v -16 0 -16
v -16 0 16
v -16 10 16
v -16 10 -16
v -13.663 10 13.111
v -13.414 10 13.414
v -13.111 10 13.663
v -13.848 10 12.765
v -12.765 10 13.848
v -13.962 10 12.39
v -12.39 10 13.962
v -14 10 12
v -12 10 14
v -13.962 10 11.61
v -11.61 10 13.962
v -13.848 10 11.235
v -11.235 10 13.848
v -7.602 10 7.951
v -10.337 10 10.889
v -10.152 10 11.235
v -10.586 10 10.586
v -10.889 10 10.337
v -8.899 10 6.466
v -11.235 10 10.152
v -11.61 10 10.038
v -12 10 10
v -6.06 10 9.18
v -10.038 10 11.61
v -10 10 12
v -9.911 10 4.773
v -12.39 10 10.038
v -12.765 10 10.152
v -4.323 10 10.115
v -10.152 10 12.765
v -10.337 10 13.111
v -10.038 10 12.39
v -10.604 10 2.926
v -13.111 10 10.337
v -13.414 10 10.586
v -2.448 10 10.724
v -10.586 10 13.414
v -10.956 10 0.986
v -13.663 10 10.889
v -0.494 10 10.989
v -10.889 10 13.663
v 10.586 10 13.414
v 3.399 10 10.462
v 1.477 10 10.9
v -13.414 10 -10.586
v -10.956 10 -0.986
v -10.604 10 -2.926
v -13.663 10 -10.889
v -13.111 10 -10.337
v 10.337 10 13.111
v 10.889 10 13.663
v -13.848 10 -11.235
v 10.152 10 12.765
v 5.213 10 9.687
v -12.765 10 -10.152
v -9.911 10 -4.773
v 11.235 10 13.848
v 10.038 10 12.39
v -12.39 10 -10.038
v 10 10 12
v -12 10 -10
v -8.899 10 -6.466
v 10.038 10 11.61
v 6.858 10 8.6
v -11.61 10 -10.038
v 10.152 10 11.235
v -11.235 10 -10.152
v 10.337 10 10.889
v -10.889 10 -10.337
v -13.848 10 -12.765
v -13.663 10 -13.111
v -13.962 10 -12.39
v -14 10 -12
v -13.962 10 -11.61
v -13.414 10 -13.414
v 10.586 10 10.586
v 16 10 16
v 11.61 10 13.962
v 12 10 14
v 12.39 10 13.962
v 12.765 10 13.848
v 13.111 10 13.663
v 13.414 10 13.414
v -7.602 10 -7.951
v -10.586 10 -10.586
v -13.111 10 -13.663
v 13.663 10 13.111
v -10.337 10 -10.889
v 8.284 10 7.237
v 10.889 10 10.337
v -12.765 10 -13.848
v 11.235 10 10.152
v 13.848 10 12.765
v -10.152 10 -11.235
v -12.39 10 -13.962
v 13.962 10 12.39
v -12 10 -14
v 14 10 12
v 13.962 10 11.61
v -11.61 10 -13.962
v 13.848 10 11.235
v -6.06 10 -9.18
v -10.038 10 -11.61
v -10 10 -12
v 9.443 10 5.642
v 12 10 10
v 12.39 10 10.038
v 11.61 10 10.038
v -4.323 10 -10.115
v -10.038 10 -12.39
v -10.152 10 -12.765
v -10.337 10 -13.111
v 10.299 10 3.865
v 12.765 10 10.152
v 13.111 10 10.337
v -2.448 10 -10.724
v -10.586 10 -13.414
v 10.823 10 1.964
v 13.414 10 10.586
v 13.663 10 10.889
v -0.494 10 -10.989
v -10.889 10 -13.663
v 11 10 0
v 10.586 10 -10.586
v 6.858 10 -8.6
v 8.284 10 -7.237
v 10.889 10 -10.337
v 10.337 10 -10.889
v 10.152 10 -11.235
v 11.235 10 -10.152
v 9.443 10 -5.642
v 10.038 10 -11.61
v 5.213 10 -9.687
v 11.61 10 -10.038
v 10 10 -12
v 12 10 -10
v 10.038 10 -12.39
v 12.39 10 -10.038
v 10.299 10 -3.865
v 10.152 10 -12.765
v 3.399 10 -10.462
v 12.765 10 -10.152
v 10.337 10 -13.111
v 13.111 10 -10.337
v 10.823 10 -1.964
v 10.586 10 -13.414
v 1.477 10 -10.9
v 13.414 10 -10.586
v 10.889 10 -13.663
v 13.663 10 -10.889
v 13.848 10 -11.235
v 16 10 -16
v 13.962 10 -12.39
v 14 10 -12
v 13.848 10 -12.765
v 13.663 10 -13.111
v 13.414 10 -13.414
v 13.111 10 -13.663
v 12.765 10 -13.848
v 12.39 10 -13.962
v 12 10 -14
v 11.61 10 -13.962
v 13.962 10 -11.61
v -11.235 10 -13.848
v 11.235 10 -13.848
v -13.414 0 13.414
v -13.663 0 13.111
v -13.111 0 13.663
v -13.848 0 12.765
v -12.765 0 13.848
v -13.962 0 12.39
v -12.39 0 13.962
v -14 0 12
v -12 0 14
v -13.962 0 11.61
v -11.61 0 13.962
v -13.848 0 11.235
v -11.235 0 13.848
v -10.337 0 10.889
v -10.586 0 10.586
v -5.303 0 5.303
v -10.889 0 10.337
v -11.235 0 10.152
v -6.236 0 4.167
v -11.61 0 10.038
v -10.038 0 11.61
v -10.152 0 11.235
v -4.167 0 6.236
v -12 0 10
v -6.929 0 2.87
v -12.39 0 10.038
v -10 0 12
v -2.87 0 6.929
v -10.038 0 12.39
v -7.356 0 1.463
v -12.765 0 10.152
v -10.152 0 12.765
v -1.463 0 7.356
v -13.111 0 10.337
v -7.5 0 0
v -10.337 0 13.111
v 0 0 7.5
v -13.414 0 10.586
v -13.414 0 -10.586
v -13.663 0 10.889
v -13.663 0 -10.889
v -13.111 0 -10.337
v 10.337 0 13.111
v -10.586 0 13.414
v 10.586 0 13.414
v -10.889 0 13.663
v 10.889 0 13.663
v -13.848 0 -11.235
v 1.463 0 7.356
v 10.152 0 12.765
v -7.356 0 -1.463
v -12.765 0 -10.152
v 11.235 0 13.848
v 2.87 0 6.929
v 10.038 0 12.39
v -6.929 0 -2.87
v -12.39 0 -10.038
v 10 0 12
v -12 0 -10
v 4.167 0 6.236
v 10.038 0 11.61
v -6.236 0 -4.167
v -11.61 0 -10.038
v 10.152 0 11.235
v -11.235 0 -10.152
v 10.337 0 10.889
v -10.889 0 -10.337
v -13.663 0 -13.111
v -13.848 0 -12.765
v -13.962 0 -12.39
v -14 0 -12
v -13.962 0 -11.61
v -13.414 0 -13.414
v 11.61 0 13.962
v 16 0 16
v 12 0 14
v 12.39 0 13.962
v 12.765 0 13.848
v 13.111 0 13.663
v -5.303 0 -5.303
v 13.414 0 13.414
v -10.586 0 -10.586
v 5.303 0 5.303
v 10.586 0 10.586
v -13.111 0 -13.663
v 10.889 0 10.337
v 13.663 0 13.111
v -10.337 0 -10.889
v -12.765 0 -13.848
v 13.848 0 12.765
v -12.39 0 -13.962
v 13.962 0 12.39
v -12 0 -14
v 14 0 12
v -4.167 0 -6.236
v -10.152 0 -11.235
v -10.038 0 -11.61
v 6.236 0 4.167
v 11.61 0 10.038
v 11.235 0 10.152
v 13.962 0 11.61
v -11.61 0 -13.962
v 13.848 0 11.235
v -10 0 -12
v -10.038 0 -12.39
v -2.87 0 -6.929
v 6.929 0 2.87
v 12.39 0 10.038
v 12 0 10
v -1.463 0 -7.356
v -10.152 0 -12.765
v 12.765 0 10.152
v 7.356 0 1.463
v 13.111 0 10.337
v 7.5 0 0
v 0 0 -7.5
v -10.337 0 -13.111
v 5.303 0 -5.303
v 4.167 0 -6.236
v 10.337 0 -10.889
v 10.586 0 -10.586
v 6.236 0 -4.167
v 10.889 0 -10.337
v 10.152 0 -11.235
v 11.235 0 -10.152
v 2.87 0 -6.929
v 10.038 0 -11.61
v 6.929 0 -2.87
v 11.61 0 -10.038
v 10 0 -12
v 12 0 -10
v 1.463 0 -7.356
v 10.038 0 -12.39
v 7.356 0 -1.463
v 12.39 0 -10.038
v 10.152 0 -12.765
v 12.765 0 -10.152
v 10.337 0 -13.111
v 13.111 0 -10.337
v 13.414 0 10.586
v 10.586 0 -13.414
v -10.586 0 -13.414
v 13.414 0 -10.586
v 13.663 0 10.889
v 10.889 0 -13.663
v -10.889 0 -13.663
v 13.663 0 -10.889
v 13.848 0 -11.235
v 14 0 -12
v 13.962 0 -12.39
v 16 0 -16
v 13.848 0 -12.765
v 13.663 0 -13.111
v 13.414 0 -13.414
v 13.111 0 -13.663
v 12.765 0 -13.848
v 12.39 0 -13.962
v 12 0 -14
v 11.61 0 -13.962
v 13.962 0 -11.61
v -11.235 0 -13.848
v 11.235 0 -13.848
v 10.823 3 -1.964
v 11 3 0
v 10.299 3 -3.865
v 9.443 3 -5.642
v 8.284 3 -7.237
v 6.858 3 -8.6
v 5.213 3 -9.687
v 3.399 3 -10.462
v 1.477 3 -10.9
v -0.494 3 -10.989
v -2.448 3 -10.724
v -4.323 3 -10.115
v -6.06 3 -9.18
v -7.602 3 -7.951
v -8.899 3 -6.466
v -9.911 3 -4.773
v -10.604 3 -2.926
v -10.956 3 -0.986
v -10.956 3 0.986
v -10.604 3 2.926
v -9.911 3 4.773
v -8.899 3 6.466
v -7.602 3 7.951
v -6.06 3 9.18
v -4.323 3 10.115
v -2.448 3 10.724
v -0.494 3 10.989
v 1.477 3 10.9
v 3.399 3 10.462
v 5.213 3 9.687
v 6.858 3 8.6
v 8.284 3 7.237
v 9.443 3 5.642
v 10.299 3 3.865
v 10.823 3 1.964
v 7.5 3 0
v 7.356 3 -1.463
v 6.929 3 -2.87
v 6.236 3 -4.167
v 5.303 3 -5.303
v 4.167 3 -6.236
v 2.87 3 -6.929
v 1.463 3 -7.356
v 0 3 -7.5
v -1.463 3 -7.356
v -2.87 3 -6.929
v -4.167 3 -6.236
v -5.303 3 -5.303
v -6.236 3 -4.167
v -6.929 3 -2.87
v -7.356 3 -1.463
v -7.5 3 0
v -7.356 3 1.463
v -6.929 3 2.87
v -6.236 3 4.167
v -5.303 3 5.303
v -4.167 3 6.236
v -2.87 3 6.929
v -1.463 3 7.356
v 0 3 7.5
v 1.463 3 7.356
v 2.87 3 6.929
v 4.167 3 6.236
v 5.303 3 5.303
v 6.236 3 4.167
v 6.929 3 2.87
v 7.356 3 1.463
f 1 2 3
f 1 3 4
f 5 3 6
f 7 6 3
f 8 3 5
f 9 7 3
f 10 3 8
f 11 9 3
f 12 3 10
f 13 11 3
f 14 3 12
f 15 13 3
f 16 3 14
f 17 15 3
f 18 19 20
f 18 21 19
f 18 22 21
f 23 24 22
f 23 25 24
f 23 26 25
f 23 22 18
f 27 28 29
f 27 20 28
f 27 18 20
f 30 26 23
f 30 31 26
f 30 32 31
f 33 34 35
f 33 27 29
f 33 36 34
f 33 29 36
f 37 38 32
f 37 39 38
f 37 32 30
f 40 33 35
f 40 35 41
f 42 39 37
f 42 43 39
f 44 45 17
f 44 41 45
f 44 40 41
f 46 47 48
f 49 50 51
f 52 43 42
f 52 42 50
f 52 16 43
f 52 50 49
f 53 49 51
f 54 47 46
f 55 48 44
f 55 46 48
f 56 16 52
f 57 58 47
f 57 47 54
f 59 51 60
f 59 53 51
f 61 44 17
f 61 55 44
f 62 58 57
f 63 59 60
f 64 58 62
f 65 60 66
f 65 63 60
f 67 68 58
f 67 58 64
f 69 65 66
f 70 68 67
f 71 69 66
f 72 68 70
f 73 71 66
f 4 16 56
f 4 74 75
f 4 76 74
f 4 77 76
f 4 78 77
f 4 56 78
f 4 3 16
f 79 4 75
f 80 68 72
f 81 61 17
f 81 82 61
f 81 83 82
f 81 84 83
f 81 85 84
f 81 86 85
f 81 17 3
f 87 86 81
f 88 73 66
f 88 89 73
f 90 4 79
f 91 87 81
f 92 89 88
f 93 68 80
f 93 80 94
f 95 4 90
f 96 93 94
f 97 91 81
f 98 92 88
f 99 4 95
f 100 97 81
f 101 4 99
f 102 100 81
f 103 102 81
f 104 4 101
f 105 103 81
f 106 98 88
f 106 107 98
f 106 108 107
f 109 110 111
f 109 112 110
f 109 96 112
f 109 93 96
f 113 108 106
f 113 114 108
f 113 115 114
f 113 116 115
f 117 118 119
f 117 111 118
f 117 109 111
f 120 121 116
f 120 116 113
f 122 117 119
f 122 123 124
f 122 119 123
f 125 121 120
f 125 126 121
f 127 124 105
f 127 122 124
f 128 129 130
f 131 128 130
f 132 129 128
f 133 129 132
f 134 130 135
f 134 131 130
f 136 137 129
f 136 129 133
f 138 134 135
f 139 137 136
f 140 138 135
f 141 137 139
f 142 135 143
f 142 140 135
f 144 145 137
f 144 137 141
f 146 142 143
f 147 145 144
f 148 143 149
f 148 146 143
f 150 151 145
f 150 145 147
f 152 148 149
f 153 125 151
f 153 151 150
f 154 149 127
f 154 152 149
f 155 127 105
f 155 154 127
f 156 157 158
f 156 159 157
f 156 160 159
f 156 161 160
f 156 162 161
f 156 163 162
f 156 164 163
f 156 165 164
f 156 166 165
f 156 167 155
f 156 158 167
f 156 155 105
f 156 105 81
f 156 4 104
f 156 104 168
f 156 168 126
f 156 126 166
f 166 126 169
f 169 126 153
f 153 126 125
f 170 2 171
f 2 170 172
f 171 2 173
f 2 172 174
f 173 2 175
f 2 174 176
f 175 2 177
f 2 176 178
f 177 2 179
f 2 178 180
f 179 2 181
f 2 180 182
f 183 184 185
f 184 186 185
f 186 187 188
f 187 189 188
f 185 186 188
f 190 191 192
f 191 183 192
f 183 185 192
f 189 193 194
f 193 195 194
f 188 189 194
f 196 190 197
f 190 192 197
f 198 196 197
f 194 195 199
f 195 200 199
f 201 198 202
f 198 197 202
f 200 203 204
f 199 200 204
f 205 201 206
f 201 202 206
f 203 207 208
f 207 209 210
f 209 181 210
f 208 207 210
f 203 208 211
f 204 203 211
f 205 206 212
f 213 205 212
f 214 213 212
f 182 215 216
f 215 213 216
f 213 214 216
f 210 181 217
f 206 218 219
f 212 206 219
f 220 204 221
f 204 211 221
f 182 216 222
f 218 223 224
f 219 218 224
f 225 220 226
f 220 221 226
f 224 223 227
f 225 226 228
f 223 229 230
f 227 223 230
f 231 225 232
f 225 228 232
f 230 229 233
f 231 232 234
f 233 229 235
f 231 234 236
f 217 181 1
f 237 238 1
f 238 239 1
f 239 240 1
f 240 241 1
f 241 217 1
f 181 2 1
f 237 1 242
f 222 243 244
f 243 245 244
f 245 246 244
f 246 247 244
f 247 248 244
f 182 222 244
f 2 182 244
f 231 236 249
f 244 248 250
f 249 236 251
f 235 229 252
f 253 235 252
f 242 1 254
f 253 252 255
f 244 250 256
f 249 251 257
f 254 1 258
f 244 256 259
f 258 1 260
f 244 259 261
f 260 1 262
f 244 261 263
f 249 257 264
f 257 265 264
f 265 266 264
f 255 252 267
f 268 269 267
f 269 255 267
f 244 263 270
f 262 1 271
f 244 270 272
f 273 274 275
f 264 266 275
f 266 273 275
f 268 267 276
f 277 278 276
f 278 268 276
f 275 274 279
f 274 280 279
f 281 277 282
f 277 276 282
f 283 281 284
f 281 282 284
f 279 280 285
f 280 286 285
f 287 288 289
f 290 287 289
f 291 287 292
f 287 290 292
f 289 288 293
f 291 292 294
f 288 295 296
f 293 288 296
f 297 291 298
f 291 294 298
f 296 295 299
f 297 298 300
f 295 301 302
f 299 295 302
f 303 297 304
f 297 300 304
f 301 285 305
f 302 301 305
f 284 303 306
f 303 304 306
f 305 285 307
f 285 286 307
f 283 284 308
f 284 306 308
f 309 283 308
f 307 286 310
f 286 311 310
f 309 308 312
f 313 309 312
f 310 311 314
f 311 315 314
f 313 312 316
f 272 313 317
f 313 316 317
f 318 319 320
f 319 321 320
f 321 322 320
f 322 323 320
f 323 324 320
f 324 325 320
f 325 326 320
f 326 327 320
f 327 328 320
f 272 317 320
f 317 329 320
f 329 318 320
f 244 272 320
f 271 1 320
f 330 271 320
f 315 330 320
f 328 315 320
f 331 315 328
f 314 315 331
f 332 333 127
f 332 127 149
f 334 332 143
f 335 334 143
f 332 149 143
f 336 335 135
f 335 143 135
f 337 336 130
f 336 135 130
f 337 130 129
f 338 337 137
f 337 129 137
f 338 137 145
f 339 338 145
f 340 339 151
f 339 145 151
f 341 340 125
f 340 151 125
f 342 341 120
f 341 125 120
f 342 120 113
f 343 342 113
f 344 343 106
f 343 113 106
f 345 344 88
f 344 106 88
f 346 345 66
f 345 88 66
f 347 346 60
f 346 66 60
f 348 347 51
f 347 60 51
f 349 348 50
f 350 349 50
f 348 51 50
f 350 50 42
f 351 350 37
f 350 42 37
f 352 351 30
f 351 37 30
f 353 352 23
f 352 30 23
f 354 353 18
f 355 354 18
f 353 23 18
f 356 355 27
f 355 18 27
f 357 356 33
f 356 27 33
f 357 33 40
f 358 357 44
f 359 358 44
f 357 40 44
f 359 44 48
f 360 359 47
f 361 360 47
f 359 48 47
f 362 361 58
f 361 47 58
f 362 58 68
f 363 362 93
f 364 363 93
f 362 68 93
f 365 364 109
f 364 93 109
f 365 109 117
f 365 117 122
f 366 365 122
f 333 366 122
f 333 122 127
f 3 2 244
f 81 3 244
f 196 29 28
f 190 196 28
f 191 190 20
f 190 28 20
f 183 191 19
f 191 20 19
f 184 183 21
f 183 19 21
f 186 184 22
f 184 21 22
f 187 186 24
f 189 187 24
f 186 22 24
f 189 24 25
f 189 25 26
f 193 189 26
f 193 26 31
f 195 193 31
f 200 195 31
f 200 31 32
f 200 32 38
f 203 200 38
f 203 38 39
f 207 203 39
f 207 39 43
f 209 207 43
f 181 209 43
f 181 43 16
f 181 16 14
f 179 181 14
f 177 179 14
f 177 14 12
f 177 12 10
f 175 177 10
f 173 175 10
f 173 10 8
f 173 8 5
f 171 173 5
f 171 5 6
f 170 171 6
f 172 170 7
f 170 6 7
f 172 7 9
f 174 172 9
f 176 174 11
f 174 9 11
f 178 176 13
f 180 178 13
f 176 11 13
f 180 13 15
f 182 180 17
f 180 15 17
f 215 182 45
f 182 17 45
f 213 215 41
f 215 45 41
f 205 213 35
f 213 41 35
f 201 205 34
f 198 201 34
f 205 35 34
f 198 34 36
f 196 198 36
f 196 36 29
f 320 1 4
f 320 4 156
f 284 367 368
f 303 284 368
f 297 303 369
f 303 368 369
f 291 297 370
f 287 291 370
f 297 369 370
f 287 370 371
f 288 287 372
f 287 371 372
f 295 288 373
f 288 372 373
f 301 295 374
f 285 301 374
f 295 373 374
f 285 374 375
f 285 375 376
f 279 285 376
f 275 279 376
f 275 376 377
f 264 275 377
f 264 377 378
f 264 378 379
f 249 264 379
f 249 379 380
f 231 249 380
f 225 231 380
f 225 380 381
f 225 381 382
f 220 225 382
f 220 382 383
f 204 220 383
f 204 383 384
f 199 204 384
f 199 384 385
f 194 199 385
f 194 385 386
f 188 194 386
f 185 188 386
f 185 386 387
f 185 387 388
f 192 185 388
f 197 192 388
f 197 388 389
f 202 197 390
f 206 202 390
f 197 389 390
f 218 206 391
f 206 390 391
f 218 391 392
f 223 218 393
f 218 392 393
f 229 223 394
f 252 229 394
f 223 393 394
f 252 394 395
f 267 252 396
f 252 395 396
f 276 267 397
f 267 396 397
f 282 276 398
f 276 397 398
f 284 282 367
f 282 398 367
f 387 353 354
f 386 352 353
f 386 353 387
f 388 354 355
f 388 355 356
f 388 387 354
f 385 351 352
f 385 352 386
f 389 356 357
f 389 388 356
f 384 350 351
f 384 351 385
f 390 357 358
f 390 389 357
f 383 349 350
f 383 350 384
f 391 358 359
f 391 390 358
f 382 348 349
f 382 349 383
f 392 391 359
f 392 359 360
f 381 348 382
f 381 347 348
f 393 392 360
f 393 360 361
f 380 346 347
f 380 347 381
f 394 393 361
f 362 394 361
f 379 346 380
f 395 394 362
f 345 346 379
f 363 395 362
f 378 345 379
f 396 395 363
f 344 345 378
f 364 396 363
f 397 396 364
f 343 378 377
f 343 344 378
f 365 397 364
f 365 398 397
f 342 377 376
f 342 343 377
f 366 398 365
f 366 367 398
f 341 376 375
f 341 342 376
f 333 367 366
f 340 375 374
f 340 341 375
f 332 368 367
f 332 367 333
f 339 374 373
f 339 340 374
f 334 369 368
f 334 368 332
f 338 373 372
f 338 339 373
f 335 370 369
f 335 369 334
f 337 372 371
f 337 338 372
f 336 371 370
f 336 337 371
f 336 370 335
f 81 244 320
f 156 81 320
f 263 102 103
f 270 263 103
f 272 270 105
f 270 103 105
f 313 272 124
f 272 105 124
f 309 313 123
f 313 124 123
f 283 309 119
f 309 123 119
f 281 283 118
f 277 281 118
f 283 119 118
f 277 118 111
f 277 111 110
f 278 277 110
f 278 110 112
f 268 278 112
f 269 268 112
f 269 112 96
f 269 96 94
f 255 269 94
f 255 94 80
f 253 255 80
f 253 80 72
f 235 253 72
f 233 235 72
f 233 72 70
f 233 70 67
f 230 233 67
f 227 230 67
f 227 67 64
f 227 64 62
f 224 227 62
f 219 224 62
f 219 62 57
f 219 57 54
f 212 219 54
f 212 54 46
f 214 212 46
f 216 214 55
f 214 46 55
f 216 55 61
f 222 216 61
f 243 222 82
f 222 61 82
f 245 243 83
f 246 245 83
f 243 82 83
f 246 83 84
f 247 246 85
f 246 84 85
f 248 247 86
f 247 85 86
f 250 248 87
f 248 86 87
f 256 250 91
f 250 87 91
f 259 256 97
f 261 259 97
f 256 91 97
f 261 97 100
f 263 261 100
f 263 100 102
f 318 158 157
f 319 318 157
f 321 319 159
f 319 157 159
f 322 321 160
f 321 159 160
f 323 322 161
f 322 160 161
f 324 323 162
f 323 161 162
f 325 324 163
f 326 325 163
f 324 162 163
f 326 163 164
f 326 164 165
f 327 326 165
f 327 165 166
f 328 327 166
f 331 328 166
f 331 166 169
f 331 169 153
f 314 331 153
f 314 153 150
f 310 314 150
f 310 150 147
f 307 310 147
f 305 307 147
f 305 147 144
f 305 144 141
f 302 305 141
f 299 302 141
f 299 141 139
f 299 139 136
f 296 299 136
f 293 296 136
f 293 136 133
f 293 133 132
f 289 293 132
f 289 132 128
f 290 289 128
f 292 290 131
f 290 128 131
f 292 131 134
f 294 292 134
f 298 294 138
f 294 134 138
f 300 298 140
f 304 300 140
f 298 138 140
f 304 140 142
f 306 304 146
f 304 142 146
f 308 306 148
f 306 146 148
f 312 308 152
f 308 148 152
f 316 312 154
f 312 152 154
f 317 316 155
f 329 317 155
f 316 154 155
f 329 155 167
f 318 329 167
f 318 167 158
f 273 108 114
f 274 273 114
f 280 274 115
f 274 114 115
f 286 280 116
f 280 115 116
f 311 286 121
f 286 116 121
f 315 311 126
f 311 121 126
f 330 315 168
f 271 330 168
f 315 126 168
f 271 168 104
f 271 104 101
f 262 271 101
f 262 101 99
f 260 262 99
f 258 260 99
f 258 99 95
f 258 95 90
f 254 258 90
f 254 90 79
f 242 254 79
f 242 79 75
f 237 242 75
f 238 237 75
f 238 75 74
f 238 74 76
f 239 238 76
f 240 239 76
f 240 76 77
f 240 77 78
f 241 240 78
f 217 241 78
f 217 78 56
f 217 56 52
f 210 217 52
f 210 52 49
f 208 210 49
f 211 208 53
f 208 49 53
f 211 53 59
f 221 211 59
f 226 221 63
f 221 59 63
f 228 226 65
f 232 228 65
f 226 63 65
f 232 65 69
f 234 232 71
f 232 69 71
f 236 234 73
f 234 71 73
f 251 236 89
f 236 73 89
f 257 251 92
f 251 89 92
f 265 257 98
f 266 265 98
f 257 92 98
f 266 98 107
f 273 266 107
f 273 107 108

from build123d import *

# Parameters (mm, degrees)
SKETCH1_W           = 32
SKETCH1_H           = 32
BOSS_EXTRUDE1_DEPTH = 10
SKETCH2_R           = 11
CUT_EXTRUDE1_DEPTH  = 7
SKETCH3_R           = 2
SKETCH3_R_2         = 7.5
CUT_EXTRUDE2_DEPTH  = 11


with BuildPart() as part:
    # Sketch1 → Boss-Extrude1 (new body)
    with BuildSketch(Plane(origin=(0, 0, 0), x_dir=(1, 0, 0), z_dir=(0, 1, 0))):
        Rectangle(SKETCH1_W, SKETCH1_H)
    extrude(amount=BOSS_EXTRUDE1_DEPTH)

    # Sketch2 → Cut-Extrude1 (cut)
    with BuildSketch(Plane(origin=(0, 10, 0), x_dir=(1, 0, 0), z_dir=(0, 1, 0))):
        Circle(SKETCH2_R)
    extrude(amount=-CUT_EXTRUDE1_DEPTH, mode=Mode.SUBTRACT)

    # Sketch3 → Cut-Extrude2 (cut, through all)
    with BuildSketch(Plane(origin=(0, 10, 0), x_dir=(1, 0, 0), z_dir=(0, 1, 0))):
        with Locations((-12, 12)):
            Circle(SKETCH3_R)
        with Locations((12, 12)):
            Circle(SKETCH3_R)
        with Locations((12, -12)):
            Circle(SKETCH3_R)
        with Locations((-12, -12)):
            Circle(SKETCH3_R)
        Circle(SKETCH3_R_2)
    extrude(amount=-CUT_EXTRUDE2_DEPTH, mode=Mode.SUBTRACT)


solid = part.part
